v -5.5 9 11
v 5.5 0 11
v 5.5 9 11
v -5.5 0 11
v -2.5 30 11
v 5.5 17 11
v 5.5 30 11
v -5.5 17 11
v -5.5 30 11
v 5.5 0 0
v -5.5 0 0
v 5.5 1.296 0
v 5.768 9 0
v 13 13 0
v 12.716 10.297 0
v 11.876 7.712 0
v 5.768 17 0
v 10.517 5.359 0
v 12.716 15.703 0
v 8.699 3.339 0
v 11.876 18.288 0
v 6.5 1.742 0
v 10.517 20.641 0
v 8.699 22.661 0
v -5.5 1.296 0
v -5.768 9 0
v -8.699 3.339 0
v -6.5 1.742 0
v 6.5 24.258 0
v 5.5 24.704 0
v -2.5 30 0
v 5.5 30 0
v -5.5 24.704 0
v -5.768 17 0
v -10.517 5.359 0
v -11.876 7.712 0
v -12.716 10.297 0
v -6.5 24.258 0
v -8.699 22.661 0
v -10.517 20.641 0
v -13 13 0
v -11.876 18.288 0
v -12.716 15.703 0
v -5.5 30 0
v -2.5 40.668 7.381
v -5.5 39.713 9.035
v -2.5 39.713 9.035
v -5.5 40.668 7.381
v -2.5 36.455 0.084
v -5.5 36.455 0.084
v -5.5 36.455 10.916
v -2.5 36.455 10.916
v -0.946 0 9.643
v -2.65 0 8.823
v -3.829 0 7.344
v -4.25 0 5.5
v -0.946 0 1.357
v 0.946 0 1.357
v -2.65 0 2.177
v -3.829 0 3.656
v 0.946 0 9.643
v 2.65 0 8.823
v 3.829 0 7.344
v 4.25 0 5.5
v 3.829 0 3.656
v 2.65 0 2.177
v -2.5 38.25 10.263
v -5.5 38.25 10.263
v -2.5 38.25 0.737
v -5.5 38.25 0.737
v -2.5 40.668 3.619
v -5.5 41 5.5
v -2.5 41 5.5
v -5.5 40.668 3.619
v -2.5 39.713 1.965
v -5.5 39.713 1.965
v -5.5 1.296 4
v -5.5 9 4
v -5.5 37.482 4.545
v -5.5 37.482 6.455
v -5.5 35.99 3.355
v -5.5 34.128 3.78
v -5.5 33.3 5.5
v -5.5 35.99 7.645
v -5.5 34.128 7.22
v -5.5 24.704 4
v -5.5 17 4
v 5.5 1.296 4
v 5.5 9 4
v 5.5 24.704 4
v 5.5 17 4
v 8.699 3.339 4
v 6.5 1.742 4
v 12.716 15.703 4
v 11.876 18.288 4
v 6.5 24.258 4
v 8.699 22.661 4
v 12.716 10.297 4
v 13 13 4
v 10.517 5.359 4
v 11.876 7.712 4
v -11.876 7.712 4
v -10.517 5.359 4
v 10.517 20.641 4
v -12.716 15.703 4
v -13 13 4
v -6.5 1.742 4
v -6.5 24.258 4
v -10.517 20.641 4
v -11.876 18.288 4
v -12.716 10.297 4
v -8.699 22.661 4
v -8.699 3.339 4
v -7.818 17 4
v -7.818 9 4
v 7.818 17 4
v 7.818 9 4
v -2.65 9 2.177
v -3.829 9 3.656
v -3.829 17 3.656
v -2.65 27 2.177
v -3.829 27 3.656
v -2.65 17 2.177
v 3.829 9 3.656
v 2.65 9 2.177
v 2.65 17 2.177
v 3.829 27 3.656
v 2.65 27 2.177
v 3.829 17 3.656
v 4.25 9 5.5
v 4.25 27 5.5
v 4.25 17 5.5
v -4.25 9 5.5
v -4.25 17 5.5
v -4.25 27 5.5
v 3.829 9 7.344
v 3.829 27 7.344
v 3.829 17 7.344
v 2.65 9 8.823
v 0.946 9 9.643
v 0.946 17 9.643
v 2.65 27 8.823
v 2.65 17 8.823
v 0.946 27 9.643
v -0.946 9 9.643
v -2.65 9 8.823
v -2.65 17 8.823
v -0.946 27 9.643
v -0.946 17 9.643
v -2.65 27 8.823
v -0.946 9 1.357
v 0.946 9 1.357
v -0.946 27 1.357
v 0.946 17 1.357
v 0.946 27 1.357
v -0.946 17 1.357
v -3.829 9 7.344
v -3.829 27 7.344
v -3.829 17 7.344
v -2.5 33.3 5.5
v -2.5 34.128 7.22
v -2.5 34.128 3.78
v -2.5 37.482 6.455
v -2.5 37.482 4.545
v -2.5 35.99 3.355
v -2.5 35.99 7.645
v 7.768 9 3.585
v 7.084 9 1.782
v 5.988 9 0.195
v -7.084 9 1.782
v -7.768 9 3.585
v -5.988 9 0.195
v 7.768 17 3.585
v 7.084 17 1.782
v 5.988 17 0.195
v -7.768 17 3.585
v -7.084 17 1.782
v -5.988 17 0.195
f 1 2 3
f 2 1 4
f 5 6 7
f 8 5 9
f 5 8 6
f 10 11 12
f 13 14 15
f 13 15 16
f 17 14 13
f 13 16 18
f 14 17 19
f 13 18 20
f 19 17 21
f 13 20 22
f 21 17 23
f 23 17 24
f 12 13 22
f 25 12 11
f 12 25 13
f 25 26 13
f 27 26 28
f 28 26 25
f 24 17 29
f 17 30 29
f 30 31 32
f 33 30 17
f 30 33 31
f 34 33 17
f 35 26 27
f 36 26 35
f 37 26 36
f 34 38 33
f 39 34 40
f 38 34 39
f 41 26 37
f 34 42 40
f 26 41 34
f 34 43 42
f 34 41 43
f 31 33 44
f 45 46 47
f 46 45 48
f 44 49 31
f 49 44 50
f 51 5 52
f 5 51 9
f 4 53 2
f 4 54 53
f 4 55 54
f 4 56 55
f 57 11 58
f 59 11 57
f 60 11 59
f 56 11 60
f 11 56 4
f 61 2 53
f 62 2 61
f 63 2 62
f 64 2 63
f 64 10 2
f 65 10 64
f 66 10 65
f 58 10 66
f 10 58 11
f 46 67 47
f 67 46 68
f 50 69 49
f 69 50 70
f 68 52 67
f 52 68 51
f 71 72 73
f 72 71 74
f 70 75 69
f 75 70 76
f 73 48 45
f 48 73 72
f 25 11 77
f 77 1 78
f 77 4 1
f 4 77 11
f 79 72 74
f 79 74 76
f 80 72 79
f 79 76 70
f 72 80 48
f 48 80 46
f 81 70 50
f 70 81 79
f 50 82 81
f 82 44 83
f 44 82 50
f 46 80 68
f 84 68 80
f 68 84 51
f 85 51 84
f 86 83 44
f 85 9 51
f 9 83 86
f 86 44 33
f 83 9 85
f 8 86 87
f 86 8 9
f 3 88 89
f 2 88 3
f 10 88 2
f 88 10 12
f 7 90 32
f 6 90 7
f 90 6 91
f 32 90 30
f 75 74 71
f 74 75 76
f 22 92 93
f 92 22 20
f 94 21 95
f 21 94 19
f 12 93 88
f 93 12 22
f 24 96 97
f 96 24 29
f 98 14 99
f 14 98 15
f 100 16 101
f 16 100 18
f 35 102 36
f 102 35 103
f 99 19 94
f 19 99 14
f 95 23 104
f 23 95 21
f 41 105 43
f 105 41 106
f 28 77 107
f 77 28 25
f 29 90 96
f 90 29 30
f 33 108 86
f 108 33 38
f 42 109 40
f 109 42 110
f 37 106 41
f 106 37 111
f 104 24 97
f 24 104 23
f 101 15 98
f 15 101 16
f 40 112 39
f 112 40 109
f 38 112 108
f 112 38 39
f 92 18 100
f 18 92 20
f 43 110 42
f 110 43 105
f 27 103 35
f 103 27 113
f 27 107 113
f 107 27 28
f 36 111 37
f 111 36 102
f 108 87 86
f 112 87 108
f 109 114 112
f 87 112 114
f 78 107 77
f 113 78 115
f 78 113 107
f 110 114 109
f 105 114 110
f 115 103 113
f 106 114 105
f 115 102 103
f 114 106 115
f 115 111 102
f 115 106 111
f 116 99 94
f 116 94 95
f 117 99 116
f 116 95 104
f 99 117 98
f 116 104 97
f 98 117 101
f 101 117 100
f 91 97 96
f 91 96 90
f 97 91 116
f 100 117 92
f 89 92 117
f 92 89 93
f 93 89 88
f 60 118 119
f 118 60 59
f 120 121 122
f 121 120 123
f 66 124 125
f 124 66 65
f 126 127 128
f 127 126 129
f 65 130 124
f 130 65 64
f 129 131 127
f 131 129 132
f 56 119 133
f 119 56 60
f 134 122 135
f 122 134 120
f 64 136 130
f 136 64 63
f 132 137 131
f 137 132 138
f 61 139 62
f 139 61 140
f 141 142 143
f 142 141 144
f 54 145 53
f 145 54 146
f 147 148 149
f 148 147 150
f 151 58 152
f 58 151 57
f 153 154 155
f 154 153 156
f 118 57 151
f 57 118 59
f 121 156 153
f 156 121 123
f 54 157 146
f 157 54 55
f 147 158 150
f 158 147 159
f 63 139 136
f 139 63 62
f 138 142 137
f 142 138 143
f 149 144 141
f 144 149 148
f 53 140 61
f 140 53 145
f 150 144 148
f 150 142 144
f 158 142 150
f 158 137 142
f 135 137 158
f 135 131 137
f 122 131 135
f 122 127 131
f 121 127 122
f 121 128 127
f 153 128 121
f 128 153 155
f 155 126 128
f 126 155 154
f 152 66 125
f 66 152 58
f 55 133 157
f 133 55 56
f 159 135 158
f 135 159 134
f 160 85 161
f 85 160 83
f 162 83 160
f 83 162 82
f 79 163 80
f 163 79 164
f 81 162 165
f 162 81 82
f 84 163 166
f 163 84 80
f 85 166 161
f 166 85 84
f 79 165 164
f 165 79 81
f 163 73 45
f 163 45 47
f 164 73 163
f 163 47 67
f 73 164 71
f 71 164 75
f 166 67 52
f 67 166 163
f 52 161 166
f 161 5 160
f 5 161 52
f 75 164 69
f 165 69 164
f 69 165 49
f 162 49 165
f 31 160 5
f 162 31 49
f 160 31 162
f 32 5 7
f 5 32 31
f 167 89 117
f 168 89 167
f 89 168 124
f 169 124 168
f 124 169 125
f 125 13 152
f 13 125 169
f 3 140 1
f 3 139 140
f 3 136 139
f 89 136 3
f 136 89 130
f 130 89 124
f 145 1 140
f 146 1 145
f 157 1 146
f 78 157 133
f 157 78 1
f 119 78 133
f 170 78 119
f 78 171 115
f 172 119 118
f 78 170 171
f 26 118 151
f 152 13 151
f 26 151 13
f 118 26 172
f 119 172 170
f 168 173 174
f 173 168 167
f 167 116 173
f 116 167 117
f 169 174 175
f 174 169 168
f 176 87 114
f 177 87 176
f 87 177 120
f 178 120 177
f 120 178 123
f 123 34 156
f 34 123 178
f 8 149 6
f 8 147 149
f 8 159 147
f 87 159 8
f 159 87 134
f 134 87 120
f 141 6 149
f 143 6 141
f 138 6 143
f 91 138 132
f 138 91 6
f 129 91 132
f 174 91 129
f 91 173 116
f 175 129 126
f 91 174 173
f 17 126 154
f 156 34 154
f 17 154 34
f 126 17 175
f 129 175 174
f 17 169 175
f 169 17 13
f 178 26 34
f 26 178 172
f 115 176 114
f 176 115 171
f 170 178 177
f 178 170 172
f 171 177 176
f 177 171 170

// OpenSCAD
box = 11;
box_length = 30;
stud_dia = 8.5;
stud_hole_length = box_length-3;
flange_bolt_dia = 4.4;
flange_dia = box;
flange_thk = 3;
flange_finger_width = 3;
flange_length = 11;
m8_clr_length = 8;
m8_clr_width = 16;
nut_gap_center = 13;
nut_gap_circle_dia = 26;
nut_gap_circle_thk = 4;

color("blue") //just so it looks like the colour of my print filament!

difference()
{
    /* make base shape */
    union()
    {
        hull()
        {
        // box
        translate([-box/2,0,0])
            cube([box,box_length,box]);
                   
        // flange
        translate([-box/2,box_length+flange_length/2,box/2])
            rotate([-90,0,-90])
                cylinder(d=flange_dia,h=box);
        }
            
        //nut_hole_piece
        translate([0,nut_gap_center,0])
            cylinder(d=nut_gap_circle_dia, h=nut_gap_circle_thk);
    }

    /* then cut these bits out of it */
    
    //hole
    translate([0,0,box/2])
        rotate([-90,0,0])
            cylinder(d=stud_dia,h=stud_hole_length);

    //flange hole
    translate([-box/2,box_length+flange_length/2,box/2])
        rotate([-90,0,-90])
            cylinder(d=flange_bolt_dia,h=box);
    
    //flange cut
        translate([-(box/2)+flange_thk,box_length,0])  
            cube([box,flange_length,box]);

    // nut hole
    translate([0,nut_gap_center-m8_clr_length/2,box/2])
        rotate([-90,0,0])
            cylinder(d=m8_clr_width,h=m8_clr_length);
}
